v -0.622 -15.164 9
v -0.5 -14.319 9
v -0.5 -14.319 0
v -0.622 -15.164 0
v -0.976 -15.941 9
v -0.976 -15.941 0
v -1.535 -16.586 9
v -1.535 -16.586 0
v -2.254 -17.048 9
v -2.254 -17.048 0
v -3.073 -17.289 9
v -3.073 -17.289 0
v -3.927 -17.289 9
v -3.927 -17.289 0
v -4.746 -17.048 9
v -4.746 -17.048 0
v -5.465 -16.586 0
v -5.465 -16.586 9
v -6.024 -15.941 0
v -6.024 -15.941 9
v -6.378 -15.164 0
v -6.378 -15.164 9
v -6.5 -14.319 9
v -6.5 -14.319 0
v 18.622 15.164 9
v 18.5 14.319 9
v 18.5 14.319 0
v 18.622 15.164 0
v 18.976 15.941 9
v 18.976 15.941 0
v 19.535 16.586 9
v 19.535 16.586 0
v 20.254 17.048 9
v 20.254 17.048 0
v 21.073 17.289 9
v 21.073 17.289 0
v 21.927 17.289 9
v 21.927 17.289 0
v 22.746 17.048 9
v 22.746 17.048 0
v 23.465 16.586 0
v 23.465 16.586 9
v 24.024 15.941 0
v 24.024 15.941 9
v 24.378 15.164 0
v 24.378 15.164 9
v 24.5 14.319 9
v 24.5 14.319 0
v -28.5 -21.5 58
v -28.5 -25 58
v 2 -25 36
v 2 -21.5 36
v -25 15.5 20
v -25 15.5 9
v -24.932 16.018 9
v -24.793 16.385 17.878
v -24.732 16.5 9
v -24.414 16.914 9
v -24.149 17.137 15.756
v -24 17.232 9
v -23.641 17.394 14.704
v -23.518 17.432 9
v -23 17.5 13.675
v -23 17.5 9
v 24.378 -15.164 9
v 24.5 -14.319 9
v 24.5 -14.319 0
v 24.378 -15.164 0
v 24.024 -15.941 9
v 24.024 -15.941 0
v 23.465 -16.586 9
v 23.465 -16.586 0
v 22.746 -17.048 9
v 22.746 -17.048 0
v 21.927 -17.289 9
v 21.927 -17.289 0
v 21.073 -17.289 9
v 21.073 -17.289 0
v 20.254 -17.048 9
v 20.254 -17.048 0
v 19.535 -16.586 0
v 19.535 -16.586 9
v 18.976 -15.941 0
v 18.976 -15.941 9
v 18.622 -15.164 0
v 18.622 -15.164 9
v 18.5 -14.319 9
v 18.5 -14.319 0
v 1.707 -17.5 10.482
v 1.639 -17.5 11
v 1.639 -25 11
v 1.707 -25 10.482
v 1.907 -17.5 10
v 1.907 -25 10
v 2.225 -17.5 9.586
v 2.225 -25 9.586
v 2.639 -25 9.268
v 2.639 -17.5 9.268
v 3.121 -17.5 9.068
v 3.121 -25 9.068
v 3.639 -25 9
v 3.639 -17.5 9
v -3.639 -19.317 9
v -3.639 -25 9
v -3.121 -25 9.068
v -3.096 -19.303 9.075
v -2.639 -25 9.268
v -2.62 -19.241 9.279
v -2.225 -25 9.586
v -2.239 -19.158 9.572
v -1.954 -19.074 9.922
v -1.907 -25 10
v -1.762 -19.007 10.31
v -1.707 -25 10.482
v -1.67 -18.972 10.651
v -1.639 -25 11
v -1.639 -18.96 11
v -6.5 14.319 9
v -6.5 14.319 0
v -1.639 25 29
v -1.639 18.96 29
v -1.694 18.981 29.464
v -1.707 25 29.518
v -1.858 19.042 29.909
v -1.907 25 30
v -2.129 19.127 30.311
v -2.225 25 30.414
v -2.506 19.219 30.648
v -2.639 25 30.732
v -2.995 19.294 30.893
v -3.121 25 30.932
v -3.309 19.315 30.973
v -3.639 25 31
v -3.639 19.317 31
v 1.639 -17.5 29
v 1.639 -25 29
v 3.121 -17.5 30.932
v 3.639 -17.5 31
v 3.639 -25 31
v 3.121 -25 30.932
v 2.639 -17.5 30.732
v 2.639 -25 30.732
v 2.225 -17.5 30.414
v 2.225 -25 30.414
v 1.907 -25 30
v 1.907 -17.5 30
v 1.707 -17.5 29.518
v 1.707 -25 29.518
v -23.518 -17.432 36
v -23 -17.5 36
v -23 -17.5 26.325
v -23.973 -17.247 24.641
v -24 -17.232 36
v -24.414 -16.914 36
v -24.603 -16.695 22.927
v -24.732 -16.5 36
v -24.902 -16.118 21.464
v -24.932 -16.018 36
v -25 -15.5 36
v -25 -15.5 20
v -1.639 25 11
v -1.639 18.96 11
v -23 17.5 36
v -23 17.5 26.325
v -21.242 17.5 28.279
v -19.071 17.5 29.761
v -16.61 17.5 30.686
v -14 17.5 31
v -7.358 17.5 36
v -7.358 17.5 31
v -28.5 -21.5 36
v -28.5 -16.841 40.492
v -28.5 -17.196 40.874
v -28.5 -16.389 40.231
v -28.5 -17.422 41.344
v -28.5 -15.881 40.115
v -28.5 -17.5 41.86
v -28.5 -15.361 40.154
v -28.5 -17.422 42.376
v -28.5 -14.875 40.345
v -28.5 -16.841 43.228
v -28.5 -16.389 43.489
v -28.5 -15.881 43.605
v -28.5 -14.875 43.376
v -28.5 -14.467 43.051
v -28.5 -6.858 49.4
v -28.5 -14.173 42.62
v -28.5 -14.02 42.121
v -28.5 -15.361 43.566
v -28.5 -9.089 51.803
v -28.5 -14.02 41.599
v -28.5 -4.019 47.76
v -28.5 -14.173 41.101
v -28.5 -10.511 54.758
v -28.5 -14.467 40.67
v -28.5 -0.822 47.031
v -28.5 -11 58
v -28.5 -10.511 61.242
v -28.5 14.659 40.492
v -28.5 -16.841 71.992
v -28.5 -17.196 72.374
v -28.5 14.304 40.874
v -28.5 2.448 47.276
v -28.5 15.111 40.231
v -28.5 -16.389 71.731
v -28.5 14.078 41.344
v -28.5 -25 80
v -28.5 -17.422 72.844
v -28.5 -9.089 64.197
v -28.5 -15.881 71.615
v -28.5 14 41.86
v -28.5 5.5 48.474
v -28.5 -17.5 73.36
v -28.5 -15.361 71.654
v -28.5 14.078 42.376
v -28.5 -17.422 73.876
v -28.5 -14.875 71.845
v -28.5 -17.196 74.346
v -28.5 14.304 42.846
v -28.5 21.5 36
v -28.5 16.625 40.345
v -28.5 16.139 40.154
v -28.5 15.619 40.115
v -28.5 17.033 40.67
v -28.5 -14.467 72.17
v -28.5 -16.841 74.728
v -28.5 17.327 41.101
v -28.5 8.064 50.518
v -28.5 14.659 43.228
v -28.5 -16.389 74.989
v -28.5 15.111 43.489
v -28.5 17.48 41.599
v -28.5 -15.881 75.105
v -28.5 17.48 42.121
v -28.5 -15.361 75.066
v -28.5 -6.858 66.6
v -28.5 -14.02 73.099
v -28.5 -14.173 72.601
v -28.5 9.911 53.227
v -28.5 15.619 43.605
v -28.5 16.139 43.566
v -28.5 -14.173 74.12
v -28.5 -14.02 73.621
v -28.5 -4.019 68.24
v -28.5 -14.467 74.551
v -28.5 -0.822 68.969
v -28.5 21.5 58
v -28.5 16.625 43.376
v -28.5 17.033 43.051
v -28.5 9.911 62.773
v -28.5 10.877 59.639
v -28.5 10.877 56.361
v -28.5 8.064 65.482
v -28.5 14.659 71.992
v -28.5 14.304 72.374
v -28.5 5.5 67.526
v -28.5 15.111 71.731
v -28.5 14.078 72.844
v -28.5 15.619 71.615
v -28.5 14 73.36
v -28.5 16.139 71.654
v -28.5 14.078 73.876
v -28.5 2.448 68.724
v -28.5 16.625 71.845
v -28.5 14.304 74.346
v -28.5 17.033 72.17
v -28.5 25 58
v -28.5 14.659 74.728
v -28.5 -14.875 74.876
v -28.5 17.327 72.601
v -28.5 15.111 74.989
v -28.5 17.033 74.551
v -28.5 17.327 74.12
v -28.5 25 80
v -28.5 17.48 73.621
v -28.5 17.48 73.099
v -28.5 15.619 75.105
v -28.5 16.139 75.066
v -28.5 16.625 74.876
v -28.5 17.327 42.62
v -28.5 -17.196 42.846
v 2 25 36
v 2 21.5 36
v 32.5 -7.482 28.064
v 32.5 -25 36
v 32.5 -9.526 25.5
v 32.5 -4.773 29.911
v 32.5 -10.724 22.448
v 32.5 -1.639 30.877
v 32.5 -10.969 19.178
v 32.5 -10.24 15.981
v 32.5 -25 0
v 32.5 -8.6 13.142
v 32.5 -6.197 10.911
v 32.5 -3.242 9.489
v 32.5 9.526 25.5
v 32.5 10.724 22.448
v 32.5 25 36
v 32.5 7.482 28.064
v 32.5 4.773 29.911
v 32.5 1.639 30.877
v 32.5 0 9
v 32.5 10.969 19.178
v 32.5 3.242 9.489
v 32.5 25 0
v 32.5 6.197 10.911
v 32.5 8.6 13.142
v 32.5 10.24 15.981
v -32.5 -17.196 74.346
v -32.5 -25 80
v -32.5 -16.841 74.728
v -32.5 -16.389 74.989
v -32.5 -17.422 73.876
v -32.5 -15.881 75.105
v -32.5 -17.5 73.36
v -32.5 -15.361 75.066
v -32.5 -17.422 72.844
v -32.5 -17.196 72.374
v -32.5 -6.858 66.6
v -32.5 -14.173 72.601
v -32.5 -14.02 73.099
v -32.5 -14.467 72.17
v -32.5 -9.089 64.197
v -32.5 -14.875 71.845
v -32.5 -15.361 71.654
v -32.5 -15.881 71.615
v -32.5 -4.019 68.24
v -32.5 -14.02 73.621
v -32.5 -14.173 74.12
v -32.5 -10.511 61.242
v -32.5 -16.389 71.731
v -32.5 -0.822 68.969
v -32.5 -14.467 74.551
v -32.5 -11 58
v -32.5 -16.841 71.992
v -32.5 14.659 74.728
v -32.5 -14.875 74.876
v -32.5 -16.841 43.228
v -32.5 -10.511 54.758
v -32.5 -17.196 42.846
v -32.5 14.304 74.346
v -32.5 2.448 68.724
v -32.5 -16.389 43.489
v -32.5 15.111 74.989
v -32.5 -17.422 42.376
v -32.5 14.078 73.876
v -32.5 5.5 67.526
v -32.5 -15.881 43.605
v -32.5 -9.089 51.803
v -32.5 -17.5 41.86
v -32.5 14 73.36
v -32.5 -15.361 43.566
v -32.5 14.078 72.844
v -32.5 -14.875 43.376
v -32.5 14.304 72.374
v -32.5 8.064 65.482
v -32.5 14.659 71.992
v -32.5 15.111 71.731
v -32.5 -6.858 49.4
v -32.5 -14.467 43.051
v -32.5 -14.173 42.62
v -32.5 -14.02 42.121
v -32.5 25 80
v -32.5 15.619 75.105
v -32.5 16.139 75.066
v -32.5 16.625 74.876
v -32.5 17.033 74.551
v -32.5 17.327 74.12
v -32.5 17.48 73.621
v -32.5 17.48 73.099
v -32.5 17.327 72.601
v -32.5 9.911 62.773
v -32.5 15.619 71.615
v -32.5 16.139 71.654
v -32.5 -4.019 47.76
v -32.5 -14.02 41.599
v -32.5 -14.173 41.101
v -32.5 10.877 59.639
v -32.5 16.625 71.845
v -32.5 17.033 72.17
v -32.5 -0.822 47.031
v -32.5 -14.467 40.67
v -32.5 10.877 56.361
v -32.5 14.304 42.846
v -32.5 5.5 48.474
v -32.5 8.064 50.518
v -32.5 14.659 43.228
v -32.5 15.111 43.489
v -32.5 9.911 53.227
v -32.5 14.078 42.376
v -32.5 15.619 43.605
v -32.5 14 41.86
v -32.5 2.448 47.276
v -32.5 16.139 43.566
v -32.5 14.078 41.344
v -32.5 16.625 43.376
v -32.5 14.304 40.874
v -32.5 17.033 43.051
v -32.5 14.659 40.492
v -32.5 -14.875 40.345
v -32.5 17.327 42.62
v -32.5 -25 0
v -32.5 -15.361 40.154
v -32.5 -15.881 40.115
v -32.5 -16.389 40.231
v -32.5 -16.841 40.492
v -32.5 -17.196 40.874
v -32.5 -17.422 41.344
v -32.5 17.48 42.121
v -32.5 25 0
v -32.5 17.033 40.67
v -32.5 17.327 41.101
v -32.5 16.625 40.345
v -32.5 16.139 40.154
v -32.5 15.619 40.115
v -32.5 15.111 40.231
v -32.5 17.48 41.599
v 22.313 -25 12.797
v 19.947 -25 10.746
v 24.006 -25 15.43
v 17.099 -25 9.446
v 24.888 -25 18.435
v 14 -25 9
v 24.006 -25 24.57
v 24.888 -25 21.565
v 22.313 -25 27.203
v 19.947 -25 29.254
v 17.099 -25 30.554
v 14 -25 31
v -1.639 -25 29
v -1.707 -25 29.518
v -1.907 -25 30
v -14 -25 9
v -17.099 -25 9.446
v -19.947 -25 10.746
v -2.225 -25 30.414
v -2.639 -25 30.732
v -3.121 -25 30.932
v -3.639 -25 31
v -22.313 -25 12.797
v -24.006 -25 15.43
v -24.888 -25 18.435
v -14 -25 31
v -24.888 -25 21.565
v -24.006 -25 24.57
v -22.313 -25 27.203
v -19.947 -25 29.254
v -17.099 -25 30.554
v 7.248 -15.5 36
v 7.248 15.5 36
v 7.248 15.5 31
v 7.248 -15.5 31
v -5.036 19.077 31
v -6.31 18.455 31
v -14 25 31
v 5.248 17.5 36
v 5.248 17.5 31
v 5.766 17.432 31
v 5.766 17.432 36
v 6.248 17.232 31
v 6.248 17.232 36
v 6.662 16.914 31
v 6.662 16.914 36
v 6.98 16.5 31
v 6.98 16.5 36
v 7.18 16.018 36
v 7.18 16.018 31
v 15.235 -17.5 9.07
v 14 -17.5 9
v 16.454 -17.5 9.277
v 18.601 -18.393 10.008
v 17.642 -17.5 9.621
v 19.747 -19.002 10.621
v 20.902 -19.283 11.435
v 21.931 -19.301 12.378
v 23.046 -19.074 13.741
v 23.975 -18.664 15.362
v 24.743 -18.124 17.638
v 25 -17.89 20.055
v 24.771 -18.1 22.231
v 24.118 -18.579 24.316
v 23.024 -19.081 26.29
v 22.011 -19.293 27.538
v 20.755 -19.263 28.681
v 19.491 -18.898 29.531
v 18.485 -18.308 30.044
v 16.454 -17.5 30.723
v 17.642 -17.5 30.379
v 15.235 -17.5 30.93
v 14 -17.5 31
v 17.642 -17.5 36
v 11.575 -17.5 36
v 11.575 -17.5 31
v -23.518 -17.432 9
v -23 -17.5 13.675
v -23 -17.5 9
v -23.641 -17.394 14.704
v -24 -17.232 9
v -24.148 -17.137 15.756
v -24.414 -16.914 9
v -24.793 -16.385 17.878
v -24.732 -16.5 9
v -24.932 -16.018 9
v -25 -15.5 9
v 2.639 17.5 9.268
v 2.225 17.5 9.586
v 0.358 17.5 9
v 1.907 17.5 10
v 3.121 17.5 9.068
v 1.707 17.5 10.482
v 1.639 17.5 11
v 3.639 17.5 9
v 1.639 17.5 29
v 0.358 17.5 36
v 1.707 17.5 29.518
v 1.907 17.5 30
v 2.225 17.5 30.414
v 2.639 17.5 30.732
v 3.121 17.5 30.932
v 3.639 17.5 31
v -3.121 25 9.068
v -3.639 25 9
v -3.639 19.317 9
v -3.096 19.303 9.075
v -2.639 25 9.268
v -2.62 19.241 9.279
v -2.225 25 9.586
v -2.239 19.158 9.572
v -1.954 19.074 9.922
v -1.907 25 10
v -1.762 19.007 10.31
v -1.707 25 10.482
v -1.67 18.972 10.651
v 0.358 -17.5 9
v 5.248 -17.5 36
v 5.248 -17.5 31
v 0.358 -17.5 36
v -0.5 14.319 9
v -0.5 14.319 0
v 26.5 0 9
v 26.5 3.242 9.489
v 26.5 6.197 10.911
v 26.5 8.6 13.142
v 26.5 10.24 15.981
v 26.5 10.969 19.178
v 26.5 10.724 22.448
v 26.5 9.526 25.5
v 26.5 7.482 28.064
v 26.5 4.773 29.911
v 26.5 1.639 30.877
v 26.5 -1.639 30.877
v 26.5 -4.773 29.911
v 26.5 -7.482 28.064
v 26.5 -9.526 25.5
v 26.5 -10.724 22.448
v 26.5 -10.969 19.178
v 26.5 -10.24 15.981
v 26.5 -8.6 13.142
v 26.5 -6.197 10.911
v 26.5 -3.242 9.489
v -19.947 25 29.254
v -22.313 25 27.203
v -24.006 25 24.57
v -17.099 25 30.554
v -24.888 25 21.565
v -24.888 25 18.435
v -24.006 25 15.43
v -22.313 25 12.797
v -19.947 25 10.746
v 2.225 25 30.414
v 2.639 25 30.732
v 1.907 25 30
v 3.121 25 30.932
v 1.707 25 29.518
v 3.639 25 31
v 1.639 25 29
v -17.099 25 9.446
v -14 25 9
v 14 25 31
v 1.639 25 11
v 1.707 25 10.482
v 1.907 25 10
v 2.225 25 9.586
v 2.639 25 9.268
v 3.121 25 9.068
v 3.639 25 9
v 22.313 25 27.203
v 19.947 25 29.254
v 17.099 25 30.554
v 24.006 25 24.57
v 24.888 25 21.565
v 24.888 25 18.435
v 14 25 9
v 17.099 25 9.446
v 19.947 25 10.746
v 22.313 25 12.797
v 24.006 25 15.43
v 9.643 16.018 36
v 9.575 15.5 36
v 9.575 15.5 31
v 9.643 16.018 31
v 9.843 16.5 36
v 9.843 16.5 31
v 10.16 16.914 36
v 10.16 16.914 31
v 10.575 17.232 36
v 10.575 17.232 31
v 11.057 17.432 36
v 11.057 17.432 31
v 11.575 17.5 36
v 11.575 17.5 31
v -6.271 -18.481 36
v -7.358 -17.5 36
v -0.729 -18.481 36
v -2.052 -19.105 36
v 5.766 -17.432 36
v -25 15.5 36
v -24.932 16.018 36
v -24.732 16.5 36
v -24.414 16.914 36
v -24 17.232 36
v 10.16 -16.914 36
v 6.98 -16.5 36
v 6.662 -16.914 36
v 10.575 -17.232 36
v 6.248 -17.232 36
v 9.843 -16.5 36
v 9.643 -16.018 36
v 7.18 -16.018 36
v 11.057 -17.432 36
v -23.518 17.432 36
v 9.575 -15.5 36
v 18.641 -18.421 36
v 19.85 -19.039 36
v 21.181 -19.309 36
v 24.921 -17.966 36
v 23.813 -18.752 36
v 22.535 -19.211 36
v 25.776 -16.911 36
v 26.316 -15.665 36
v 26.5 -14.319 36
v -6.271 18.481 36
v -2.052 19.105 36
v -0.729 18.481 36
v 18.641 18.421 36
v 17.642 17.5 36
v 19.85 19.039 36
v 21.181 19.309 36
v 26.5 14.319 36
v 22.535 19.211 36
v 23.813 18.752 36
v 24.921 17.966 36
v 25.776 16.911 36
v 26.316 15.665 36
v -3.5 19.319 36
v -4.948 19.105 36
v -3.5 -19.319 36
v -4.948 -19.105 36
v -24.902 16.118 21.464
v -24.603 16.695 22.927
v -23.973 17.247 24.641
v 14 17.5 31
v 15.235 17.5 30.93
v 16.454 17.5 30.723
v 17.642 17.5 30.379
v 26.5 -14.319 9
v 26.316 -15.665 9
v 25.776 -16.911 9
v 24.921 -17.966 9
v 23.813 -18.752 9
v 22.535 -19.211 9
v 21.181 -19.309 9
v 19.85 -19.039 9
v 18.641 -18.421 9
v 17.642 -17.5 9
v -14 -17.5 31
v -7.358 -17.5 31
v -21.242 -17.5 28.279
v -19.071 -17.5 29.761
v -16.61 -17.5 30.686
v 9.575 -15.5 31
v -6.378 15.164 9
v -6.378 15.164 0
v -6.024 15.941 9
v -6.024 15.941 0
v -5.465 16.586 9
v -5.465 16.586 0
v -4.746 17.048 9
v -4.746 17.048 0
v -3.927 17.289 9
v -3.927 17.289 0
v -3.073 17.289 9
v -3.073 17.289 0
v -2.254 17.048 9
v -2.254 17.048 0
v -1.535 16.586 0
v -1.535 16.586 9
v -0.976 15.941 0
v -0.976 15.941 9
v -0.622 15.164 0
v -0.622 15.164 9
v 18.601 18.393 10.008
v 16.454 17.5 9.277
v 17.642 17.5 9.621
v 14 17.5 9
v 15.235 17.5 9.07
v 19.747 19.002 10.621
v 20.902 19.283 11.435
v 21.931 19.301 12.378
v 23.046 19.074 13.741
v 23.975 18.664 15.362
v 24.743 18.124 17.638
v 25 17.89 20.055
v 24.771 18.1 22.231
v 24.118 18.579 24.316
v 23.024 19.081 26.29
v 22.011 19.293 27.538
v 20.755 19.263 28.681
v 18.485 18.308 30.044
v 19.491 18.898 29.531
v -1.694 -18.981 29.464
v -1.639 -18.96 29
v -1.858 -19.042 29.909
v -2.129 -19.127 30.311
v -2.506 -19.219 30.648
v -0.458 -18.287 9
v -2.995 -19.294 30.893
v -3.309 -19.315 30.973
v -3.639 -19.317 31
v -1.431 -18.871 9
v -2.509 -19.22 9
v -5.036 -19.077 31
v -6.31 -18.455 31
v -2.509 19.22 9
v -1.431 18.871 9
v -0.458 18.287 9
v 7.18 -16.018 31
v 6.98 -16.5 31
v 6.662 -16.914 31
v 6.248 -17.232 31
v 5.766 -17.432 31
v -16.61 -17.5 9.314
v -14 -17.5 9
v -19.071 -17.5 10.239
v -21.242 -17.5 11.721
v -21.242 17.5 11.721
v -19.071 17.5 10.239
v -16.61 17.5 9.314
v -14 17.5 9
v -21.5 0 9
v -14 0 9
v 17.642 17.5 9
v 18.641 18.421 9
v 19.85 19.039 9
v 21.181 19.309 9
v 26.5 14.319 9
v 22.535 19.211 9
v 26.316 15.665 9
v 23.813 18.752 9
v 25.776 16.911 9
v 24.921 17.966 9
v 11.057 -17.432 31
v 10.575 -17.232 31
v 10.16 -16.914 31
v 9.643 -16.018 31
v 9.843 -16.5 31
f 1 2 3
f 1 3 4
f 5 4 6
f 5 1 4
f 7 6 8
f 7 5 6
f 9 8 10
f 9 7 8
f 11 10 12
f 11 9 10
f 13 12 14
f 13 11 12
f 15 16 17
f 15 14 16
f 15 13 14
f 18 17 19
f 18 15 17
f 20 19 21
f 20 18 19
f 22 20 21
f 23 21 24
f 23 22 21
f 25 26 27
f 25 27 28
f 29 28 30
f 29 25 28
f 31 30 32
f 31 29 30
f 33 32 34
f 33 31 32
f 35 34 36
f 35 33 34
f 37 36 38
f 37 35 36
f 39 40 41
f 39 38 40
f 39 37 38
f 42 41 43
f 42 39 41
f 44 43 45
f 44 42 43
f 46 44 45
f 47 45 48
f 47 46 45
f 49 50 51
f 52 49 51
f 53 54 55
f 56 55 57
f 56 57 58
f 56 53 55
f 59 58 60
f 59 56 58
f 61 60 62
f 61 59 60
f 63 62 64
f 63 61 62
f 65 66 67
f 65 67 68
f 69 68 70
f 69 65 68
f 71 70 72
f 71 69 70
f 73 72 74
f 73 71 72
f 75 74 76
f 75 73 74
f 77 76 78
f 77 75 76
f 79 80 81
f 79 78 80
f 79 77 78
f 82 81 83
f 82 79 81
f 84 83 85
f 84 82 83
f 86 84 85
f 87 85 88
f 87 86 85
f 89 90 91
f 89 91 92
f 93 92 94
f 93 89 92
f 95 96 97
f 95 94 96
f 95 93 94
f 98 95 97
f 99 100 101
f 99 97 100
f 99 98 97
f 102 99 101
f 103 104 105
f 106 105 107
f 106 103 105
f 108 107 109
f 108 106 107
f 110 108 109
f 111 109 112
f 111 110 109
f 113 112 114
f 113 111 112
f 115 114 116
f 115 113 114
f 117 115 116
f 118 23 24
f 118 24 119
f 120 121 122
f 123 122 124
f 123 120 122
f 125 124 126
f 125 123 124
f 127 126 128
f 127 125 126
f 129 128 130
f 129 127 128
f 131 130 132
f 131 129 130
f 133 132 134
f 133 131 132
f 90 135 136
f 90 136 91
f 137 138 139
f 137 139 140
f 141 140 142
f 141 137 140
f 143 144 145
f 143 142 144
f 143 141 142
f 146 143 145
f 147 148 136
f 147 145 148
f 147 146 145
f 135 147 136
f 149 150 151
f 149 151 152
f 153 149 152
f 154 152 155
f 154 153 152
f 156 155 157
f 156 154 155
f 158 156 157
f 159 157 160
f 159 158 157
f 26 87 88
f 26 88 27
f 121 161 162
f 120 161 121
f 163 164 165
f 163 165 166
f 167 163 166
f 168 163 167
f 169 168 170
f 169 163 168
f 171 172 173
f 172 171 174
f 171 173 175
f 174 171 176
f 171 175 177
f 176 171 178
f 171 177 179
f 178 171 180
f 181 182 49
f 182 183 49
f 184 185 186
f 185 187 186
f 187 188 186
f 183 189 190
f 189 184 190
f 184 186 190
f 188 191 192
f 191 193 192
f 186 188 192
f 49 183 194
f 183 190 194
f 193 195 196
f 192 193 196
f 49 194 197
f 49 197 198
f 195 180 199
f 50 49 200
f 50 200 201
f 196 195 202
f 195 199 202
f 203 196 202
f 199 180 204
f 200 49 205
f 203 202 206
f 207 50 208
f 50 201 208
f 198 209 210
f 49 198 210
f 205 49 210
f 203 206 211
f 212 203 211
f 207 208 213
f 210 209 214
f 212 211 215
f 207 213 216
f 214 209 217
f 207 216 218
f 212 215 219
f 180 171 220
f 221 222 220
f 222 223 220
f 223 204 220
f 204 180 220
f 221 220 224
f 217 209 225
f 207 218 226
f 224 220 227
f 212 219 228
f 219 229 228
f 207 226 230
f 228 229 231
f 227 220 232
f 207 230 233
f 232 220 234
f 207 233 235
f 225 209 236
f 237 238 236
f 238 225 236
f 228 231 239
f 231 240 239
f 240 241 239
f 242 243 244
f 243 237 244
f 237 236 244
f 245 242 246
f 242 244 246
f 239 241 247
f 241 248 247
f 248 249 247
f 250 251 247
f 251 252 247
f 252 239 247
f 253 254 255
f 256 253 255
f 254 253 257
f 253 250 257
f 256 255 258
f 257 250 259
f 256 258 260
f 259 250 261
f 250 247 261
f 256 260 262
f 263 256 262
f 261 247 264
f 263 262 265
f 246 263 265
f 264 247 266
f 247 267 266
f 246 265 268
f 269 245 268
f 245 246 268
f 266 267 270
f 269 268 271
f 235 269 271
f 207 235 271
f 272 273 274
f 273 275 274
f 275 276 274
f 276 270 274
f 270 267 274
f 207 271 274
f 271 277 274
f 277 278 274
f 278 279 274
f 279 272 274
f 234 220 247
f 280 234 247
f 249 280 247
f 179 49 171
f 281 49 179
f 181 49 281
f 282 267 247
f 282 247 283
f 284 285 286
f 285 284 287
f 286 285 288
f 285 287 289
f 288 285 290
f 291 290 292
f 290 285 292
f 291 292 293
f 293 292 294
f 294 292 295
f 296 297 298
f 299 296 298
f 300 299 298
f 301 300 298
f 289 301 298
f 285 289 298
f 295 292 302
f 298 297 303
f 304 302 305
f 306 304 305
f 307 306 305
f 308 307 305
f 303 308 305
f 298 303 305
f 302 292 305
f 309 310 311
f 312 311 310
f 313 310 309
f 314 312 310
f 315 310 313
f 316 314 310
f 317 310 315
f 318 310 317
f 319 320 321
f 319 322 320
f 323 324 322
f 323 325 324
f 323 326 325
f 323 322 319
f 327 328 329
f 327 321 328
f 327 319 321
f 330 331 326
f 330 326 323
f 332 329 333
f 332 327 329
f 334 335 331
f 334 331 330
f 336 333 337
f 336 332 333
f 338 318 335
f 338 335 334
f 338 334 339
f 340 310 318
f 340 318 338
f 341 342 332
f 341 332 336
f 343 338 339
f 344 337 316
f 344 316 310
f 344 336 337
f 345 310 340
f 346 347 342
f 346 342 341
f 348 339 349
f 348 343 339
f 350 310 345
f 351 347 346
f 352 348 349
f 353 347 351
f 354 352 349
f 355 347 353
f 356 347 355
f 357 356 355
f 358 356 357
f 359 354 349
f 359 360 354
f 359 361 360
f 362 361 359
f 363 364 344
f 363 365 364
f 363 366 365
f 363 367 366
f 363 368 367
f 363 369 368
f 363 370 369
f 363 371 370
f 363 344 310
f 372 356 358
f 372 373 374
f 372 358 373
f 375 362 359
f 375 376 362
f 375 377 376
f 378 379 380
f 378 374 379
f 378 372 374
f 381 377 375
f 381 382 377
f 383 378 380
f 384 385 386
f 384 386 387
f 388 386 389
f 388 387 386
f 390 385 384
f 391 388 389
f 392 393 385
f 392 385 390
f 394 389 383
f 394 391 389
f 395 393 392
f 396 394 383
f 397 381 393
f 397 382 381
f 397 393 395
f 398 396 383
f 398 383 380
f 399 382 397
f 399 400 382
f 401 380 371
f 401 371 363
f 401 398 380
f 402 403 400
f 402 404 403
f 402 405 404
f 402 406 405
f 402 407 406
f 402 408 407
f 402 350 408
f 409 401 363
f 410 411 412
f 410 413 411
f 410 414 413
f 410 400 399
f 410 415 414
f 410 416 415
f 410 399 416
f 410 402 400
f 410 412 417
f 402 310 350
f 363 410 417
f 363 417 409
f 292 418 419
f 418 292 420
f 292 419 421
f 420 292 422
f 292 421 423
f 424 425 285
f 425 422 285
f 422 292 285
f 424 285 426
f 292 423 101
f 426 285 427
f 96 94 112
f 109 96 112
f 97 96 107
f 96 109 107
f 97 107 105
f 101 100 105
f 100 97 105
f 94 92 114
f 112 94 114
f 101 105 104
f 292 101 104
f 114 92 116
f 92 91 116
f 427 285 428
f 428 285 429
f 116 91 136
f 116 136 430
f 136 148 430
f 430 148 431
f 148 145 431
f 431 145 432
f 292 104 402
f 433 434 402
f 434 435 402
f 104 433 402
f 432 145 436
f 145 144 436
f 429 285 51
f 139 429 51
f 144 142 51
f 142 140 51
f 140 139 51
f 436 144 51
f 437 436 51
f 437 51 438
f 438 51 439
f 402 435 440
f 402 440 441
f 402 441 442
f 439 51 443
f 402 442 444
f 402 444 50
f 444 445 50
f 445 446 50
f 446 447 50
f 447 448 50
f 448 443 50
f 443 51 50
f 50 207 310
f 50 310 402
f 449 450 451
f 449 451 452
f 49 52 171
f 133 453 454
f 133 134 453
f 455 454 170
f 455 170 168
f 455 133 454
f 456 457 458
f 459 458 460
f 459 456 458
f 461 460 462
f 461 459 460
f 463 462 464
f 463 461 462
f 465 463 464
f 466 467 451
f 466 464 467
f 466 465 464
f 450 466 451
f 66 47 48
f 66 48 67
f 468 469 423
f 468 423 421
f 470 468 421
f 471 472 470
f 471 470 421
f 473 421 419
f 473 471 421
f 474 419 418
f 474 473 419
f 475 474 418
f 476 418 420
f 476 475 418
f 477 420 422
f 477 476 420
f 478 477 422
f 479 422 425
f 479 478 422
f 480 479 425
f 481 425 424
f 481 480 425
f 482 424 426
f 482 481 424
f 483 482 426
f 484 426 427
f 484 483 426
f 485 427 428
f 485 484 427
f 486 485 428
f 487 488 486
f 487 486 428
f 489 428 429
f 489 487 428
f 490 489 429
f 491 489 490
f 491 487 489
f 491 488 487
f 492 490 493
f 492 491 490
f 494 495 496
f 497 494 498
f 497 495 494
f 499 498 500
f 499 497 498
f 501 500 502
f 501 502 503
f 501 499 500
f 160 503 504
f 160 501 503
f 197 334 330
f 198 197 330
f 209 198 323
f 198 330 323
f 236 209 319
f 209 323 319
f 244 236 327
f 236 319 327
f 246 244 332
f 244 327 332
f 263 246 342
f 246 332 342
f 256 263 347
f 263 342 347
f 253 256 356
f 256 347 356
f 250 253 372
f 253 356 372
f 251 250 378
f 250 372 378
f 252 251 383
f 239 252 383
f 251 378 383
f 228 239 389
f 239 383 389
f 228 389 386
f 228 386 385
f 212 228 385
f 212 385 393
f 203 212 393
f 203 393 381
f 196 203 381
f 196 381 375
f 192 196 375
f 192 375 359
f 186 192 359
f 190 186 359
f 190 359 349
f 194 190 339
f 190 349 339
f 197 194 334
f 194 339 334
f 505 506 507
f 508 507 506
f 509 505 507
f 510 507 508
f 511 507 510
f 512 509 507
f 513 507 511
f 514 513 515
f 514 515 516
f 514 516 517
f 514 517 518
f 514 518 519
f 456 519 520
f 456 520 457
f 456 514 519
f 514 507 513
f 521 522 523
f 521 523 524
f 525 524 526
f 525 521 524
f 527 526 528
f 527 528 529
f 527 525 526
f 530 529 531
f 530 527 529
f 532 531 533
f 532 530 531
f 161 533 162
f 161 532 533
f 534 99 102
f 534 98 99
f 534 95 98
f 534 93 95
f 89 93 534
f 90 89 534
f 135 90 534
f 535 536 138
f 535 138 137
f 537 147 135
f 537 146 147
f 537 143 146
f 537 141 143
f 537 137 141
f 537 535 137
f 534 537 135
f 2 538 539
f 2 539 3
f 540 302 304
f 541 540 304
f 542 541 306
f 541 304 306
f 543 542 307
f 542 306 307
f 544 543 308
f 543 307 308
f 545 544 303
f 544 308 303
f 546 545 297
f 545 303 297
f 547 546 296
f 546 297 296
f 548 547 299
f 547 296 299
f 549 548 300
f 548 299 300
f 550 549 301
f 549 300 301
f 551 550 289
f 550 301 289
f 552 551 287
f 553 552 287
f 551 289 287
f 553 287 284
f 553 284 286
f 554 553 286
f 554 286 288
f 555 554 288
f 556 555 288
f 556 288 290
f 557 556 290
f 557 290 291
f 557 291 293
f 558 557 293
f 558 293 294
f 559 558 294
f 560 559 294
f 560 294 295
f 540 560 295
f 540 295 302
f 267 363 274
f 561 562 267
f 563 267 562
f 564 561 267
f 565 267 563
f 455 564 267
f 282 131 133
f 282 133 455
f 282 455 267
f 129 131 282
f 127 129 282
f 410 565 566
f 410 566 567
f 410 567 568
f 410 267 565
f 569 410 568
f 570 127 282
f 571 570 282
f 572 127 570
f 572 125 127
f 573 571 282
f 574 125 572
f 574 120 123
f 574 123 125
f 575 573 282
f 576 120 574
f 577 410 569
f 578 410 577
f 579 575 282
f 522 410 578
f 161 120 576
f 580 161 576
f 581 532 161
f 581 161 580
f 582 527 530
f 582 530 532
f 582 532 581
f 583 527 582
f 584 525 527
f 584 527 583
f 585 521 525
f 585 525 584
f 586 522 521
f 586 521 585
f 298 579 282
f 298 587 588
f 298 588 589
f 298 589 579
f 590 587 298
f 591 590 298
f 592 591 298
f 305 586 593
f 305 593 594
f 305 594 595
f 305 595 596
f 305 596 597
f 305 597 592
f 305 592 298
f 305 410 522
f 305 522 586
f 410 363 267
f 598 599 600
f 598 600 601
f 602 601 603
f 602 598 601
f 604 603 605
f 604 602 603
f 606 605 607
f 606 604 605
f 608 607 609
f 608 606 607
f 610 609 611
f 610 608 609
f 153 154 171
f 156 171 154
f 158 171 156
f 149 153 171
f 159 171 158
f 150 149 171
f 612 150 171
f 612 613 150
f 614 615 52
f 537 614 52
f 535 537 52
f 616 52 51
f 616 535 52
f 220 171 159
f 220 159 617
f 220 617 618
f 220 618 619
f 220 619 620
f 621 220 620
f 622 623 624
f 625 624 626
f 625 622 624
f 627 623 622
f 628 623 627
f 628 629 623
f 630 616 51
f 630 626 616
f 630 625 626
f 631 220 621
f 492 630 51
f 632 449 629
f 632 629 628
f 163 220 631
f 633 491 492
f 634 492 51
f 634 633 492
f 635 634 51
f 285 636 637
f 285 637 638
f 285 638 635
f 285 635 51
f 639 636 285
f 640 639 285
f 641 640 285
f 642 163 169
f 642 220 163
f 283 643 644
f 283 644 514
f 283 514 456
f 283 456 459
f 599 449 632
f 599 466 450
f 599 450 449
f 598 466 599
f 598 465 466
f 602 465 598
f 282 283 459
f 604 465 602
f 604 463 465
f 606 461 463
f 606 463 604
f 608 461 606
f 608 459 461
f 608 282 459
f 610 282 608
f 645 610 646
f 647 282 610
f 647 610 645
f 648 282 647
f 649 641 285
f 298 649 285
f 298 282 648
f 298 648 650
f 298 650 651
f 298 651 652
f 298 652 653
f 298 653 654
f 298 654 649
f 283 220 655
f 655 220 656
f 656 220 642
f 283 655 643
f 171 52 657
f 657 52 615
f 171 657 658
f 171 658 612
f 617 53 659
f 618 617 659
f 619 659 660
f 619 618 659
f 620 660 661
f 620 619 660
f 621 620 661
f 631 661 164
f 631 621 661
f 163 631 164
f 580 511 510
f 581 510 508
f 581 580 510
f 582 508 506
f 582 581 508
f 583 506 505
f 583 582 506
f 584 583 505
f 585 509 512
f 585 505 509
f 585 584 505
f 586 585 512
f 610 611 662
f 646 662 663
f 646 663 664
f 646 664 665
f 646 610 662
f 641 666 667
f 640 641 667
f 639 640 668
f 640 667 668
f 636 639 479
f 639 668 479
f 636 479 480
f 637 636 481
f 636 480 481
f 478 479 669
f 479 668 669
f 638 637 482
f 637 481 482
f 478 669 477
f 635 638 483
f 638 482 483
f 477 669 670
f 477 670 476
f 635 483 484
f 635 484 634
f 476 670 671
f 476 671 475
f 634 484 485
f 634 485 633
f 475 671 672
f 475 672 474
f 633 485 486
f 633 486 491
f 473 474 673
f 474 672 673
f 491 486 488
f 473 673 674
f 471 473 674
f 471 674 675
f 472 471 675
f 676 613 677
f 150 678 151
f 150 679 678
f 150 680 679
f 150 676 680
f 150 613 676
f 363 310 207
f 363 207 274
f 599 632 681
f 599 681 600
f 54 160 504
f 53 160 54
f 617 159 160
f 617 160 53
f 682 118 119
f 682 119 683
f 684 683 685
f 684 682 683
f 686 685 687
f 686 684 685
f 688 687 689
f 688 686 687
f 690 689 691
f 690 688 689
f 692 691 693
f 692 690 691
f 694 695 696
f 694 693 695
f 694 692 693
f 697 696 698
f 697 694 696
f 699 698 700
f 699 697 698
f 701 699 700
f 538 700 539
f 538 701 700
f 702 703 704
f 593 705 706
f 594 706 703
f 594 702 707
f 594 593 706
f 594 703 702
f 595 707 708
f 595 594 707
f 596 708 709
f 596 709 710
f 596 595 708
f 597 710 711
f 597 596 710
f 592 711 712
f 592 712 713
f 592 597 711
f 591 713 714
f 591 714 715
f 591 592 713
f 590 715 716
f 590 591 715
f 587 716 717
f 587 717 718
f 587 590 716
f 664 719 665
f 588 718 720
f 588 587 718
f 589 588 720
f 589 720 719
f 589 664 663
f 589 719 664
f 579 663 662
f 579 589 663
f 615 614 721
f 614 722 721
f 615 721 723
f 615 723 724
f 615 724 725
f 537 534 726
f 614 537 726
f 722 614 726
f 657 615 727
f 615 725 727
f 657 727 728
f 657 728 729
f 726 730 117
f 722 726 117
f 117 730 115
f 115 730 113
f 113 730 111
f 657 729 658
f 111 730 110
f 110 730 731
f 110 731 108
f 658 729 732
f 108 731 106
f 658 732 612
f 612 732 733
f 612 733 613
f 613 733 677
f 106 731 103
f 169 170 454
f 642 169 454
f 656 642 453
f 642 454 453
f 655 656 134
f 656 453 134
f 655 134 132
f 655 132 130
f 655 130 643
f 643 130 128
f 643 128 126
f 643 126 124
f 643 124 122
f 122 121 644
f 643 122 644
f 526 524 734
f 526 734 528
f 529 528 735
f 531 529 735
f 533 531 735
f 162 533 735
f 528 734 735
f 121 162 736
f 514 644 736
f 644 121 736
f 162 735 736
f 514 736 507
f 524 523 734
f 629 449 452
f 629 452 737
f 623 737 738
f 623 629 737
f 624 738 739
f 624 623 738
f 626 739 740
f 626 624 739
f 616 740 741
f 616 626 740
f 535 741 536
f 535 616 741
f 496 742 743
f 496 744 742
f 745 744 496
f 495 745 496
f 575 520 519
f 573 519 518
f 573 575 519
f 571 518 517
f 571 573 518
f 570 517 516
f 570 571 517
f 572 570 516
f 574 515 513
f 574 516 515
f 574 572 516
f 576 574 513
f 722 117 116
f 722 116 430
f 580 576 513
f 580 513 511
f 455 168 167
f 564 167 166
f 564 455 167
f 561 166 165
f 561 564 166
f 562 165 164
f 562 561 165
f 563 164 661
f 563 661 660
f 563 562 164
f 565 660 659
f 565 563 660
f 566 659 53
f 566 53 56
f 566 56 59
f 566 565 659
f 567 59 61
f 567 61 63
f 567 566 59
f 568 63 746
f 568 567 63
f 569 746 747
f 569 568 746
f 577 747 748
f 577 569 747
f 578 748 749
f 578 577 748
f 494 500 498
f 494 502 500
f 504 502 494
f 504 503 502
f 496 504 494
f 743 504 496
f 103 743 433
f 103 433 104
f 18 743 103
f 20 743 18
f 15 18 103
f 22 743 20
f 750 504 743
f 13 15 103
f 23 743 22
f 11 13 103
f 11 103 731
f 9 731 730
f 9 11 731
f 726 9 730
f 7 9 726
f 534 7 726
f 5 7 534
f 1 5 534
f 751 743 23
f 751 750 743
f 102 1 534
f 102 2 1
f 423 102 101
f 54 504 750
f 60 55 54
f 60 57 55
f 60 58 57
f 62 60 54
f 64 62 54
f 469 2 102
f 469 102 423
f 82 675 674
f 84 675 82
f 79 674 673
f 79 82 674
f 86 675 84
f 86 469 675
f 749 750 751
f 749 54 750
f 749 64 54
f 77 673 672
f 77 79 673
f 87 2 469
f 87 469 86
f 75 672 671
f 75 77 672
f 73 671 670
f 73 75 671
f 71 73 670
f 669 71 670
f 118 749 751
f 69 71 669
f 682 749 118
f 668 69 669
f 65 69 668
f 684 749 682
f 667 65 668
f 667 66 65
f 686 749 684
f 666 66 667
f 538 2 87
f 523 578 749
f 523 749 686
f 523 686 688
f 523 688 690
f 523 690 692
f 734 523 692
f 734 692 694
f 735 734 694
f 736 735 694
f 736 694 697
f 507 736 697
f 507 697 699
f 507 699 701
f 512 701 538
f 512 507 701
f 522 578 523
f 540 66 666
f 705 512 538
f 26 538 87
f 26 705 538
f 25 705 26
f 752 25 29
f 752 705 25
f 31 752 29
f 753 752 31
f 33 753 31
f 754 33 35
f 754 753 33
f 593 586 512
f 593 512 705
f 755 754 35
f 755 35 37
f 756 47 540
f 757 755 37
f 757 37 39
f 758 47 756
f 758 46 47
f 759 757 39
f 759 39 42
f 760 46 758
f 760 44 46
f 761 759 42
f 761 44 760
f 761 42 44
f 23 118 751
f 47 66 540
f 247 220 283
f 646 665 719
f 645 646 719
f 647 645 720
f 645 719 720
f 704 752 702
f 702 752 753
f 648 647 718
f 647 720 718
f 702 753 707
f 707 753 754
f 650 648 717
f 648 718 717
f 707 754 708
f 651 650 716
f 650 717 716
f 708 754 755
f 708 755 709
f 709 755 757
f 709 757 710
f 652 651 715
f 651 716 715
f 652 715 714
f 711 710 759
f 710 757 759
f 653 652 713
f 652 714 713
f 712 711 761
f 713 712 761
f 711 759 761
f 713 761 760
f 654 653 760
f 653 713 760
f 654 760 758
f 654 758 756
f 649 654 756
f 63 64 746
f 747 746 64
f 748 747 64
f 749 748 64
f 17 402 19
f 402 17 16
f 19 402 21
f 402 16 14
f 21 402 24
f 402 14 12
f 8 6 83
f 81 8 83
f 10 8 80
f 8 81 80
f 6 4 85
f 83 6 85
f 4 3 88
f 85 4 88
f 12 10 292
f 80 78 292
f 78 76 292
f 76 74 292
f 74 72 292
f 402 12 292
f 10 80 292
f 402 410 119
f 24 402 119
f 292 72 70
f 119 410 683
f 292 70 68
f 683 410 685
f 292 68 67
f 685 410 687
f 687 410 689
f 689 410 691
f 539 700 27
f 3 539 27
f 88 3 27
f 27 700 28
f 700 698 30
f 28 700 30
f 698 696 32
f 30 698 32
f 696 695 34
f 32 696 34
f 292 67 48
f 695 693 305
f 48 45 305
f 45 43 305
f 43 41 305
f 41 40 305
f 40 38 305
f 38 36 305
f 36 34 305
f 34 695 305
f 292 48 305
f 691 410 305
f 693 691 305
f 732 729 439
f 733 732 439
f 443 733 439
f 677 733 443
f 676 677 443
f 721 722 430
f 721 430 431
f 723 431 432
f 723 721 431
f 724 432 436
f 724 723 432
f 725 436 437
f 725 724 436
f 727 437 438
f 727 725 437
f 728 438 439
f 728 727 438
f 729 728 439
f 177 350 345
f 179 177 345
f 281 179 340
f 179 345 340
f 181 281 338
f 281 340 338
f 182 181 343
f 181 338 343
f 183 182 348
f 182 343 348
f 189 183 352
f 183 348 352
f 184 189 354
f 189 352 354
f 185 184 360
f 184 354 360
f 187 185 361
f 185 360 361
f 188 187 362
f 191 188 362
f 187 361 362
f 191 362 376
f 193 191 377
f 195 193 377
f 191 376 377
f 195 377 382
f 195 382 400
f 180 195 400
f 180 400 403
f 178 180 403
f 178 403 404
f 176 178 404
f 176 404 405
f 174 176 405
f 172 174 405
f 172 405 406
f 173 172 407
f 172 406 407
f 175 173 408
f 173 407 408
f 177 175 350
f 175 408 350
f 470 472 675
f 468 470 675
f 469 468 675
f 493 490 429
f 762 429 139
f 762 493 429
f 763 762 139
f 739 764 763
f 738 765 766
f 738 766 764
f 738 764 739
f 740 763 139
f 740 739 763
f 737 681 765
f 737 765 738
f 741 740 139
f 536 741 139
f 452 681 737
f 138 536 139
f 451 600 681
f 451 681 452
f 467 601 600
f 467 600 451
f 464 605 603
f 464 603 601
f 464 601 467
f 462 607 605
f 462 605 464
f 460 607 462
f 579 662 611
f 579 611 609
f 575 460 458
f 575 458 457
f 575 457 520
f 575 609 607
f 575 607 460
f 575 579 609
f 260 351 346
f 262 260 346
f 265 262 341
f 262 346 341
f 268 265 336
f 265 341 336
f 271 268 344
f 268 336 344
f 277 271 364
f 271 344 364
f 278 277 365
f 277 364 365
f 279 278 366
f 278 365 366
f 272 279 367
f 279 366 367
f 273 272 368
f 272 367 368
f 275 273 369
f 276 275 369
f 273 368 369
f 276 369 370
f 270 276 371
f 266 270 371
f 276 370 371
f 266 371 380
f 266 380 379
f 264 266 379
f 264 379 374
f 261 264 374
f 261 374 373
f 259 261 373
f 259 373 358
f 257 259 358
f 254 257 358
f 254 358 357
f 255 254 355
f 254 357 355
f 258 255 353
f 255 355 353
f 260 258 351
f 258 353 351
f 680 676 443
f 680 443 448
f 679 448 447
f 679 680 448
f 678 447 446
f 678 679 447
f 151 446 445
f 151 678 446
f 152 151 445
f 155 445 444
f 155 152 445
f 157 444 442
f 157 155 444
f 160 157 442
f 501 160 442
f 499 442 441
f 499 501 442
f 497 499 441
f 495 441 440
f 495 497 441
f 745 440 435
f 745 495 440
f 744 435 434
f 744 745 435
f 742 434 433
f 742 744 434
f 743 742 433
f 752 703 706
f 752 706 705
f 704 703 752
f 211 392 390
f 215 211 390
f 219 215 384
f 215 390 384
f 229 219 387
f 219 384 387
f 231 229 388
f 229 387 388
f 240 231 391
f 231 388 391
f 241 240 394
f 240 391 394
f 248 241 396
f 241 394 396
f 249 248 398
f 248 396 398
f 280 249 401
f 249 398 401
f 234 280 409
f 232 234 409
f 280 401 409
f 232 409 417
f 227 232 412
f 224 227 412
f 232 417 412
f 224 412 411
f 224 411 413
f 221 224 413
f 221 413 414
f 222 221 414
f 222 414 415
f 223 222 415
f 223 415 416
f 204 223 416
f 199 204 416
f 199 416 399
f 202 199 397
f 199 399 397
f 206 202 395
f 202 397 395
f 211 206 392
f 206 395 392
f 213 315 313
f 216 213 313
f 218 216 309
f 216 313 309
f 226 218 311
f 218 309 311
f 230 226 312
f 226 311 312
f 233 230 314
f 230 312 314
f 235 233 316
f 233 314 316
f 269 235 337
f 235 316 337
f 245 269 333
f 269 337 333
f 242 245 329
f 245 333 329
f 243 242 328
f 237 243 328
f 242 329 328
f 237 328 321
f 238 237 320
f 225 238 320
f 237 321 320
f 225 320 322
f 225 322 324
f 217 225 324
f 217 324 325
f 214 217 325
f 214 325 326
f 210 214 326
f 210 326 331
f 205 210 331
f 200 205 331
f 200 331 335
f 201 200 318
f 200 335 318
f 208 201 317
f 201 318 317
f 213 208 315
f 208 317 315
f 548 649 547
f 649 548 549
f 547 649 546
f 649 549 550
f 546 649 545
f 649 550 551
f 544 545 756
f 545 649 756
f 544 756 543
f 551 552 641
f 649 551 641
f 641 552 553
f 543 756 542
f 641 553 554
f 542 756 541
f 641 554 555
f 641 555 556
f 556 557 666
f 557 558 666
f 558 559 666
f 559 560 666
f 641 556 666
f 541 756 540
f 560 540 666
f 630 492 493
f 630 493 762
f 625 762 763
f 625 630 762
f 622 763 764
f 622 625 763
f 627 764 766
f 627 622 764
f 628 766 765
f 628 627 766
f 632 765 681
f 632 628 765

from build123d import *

# Parameters (mm, degrees)
SKIZZE1_W                        = 65
SKIZZE1_H                        = 50
AUFSATZ_LINEAR_AUSTRAGEN1_DEPTH  = 36
SKIZZE2_W                        = 80
SKIZZE2_H                        = 50
AUFSATZ_LINEAR_AUSTRAGEN2_DEPTH  = 4
SKIZZE3_R                        = 11
SKIZZE3_R_2                      = 1.75
SCHNITT_LINEAR_AUSTRAGEN1_DEPTH  = 4
AUFSATZ_LINEAR_AUSTRAGEN3_DEPTH  = 3.5
AUFSATZ_LINEAR_AUSTRAGEN4_DEPTH  = 3.5
SCHNITT_LINEAR_AUSTRAGEN2_DEPTH  = 27
SKIZZE7_R                        = 11
SCHNITT_LINEAR_AUSTRAGEN3_DEPTH  = 54
SCHNITT_LINEAR_AUSTRAGEN4_DEPTH  = 54
SCHNITT_LINEAR_AUSTRAGEN10_DEPTH = 37
SCHNITT_LINEAR_AUSTRAGEN11_DEPTH = 37


with BuildPart() as part:
    # Skizze1 → Aufsatz-Linear austragen1 (new body)
    with BuildSketch(Plane.XY):
        Rectangle(SKIZZE1_W, SKIZZE1_H)
    extrude(amount=AUFSATZ_LINEAR_AUSTRAGEN1_DEPTH)

    # Skizze2 → Aufsatz-Linear austragen2 (add)
    with BuildSketch(Plane.ZY.offset(32.5)):
        with Locations((40, 0)):
            Rectangle(SKIZZE2_W, SKIZZE2_H)
    extrude(amount=-AUFSATZ_LINEAR_AUSTRAGEN2_DEPTH)

    # Skizze3 → Schnitt-Linear austragen1 (cut)
    with BuildSketch(Plane.ZY.offset(32.5)):
        with Locations(Location((58, 0, 0), (0, 0, 270))):
            Circle(SKIZZE3_R)
        with Locations(Location((73.360257159, 15.75, 0), (0, 0, 270))):
            Circle(SKIZZE3_R_2)
        with Locations(Location((73.360257159, -15.75, 0), (0, 0, 270))):
            Circle(SKIZZE3_R_2)
        with Locations(Location((41.860257159, -15.75, 0), (0, 0, 270))):
            Circle(SKIZZE3_R_2)
        with Locations(Location((41.860257159, 15.75, 0), (0, 0, 270))):
            Circle(SKIZZE3_R_2)
    extrude(amount=-SCHNITT_LINEAR_AUSTRAGEN1_DEPTH, mode=Mode.SUBTRACT)

    # Skizze4 → Aufsatz-Linear austragen3 (add)
    with BuildSketch(Plane(origin=(0, 25, 0), x_dir=(1, 0, 0), z_dir=(0, 1, 0))):
        Polygon((-28.5, -58), (2, -36), (-28.5, -36), align=None)
    extrude(amount=-AUFSATZ_LINEAR_AUSTRAGEN3_DEPTH)

    # Skizze5 → Aufsatz-Linear austragen4 (add)
    with BuildSketch(Plane.XZ.offset(25)):
        Polygon((-28.5, 58), (2, 36), (-28.5, 36), align=None)
    extrude(amount=-AUFSATZ_LINEAR_AUSTRAGEN4_DEPTH)

    # Skizze6 → Schnitt-Linear austragen2 (cut)
    with BuildSketch(Plane.XY.offset(36)):
        with BuildLine():
            Line((-23, 17.5), (5.24803832, 17.5))
            ThreePointArc((5.24803832, 17.5), (6.662251883, 16.914213562), (7.24803832, 15.5))
            Line((7.24803832, 15.5), (7.24803832, -15.5))
            ThreePointArc((7.24803832, -15.5), (6.662251883, -16.914213562), (5.24803832, -17.5))
            Line((5.24803832, -17.5), (-23, -17.5))
            ThreePointArc((-23, -17.5), (-24.414213562, -16.914213562), (-25, -15.5))
            Line((-25, -15.5), (-25, 15.5))
            ThreePointArc((-25, 15.5), (-24.414213562, 16.914213562), (-23, 17.5))
        make_face()
        with BuildLine():
            Line((25, 15.5), (25, -15.5))
            ThreePointArc((25, -15.5), (24.414213562, -16.914213562), (23, -17.5))
            Line((23, -17.5), (11.574569139, -17.5))
            ThreePointArc((11.574569139, -17.5), (10.160355577, -16.914213562), (9.574569139, -15.5))
            Line((9.574569139, -15.5), (9.574569139, 15.5))
            ThreePointArc((9.574569139, 15.5), (10.160355577, 16.914213562), (11.574569139, 17.5))
            Line((11.574569139, 17.5), (23, 17.5))
            ThreePointArc((23, 17.5), (24.414213562, 16.914213562), (25, 15.5))
        make_face()
    extrude(amount=-SCHNITT_LINEAR_AUSTRAGEN2_DEPTH, mode=Mode.SUBTRACT)

    # Skizze7 → Schnitt-Linear austragen3 (cut)
    with BuildSketch(Plane(origin=(32.5, 0, 0), x_dir=(0, 0, -1), z_dir=(1, 0, 0))):
        with Locations((-20, 0)):
            Circle(SKIZZE7_R)
    extrude(amount=-SCHNITT_LINEAR_AUSTRAGEN3_DEPTH, mode=Mode.SUBTRACT)

    # Skizze8 → Schnitt-Linear austragen4 (cut)
    with BuildSketch(Plane(origin=(0, 25, 0), x_dir=(1, 0, 0), z_dir=(0, 1, 0))):
        with BuildLine():
            Line((-14, -9), (-3.639017883, -9))
            ThreePointArc((-3.639017883, -9), (-2.22480432, -9.585786438), (-1.639017883, -11))
            Line((-1.639017883, -11), (-1.639017883, -29))
            ThreePointArc((-1.639017883, -29), (-2.22480432, -30.414213562), (-3.639017883, -31))
            Line((-3.639017883, -31), (-14, -31))
            ThreePointArc((-14, -31), (-25, -20), (-14, -9))
        make_face()
        with BuildLine():
            Line((3.639017883, -9), (14, -9))
            ThreePointArc((14, -9), (25, -20), (14, -31))
            Line((14, -31), (3.639017883, -31))
            ThreePointArc((3.639017883, -31), (2.22480432, -30.414213562), (1.639017883, -29))
            Line((1.639017883, -29), (1.639017883, -11))
            ThreePointArc((1.639017883, -11), (2.22480432, -9.585786438), (3.639017883, -9))
        make_face()
    extrude(amount=-SCHNITT_LINEAR_AUSTRAGEN4_DEPTH, mode=Mode.SUBTRACT)

    # Skizze9 → Schnitt-Linear austragen10 (cut)
    with BuildSketch(Plane.XY.offset(9)):
        with BuildLine():
            Line((-0.5, 14.31913721), (-0.5, -14.31913721))
            ThreePointArc((-0.5, -14.31913721), (-3.5, -17.31913721), (-6.5, -14.31913721))
            Line((-6.5, -14.31913721), (-6.5, 14.31913721))
            ThreePointArc((-6.5, 14.31913721), (-3.5, 17.31913721), (-0.5, 14.31913721))
        make_face()
        with BuildLine():
            Line((24.5, 14.31913721), (24.5, -14.31913721))
            ThreePointArc((24.5, -14.31913721), (21.5, -17.31913721), (18.5, -14.31913721))
            Line((18.5, -14.31913721), (18.5, 14.31913721))
            ThreePointArc((18.5, 14.31913721), (21.5, 17.31913721), (24.5, 14.31913721))
        make_face()
    extrude(amount=-SCHNITT_LINEAR_AUSTRAGEN10_DEPTH, mode=Mode.SUBTRACT)

    # Skizze14 → Schnitt-Linear austragen11 (cut)
    with BuildSketch(Plane.XY.offset(9)):
        with BuildLine():
            Line((1.5, 14.31913721), (1.5, -14.31913721))
            ThreePointArc((1.5, -14.31913721), (-3.5, -19.31913721), (-8.5, -14.31913721))
            Line((-8.5, -14.31913721), (-8.5, 14.31913721))
            ThreePointArc((-8.5, 14.31913721), (-3.5, 19.31913721), (1.5, 14.31913721))
        make_face()
        with BuildLine():
            Line((26.5, 14.31913721), (26.5, -14.31913721))
            ThreePointArc((26.5, -14.31913721), (21.5, -19.31913721), (16.5, -14.31913721))
            Line((16.5, -14.31913721), (16.5, 14.31913721))
            ThreePointArc((16.5, 14.31913721), (21.5, 19.31913721), (26.5, 14.31913721))
        make_face()
    extrude(amount=SCHNITT_LINEAR_AUSTRAGEN11_DEPTH, mode=Mode.SUBTRACT)


solid = part.part
